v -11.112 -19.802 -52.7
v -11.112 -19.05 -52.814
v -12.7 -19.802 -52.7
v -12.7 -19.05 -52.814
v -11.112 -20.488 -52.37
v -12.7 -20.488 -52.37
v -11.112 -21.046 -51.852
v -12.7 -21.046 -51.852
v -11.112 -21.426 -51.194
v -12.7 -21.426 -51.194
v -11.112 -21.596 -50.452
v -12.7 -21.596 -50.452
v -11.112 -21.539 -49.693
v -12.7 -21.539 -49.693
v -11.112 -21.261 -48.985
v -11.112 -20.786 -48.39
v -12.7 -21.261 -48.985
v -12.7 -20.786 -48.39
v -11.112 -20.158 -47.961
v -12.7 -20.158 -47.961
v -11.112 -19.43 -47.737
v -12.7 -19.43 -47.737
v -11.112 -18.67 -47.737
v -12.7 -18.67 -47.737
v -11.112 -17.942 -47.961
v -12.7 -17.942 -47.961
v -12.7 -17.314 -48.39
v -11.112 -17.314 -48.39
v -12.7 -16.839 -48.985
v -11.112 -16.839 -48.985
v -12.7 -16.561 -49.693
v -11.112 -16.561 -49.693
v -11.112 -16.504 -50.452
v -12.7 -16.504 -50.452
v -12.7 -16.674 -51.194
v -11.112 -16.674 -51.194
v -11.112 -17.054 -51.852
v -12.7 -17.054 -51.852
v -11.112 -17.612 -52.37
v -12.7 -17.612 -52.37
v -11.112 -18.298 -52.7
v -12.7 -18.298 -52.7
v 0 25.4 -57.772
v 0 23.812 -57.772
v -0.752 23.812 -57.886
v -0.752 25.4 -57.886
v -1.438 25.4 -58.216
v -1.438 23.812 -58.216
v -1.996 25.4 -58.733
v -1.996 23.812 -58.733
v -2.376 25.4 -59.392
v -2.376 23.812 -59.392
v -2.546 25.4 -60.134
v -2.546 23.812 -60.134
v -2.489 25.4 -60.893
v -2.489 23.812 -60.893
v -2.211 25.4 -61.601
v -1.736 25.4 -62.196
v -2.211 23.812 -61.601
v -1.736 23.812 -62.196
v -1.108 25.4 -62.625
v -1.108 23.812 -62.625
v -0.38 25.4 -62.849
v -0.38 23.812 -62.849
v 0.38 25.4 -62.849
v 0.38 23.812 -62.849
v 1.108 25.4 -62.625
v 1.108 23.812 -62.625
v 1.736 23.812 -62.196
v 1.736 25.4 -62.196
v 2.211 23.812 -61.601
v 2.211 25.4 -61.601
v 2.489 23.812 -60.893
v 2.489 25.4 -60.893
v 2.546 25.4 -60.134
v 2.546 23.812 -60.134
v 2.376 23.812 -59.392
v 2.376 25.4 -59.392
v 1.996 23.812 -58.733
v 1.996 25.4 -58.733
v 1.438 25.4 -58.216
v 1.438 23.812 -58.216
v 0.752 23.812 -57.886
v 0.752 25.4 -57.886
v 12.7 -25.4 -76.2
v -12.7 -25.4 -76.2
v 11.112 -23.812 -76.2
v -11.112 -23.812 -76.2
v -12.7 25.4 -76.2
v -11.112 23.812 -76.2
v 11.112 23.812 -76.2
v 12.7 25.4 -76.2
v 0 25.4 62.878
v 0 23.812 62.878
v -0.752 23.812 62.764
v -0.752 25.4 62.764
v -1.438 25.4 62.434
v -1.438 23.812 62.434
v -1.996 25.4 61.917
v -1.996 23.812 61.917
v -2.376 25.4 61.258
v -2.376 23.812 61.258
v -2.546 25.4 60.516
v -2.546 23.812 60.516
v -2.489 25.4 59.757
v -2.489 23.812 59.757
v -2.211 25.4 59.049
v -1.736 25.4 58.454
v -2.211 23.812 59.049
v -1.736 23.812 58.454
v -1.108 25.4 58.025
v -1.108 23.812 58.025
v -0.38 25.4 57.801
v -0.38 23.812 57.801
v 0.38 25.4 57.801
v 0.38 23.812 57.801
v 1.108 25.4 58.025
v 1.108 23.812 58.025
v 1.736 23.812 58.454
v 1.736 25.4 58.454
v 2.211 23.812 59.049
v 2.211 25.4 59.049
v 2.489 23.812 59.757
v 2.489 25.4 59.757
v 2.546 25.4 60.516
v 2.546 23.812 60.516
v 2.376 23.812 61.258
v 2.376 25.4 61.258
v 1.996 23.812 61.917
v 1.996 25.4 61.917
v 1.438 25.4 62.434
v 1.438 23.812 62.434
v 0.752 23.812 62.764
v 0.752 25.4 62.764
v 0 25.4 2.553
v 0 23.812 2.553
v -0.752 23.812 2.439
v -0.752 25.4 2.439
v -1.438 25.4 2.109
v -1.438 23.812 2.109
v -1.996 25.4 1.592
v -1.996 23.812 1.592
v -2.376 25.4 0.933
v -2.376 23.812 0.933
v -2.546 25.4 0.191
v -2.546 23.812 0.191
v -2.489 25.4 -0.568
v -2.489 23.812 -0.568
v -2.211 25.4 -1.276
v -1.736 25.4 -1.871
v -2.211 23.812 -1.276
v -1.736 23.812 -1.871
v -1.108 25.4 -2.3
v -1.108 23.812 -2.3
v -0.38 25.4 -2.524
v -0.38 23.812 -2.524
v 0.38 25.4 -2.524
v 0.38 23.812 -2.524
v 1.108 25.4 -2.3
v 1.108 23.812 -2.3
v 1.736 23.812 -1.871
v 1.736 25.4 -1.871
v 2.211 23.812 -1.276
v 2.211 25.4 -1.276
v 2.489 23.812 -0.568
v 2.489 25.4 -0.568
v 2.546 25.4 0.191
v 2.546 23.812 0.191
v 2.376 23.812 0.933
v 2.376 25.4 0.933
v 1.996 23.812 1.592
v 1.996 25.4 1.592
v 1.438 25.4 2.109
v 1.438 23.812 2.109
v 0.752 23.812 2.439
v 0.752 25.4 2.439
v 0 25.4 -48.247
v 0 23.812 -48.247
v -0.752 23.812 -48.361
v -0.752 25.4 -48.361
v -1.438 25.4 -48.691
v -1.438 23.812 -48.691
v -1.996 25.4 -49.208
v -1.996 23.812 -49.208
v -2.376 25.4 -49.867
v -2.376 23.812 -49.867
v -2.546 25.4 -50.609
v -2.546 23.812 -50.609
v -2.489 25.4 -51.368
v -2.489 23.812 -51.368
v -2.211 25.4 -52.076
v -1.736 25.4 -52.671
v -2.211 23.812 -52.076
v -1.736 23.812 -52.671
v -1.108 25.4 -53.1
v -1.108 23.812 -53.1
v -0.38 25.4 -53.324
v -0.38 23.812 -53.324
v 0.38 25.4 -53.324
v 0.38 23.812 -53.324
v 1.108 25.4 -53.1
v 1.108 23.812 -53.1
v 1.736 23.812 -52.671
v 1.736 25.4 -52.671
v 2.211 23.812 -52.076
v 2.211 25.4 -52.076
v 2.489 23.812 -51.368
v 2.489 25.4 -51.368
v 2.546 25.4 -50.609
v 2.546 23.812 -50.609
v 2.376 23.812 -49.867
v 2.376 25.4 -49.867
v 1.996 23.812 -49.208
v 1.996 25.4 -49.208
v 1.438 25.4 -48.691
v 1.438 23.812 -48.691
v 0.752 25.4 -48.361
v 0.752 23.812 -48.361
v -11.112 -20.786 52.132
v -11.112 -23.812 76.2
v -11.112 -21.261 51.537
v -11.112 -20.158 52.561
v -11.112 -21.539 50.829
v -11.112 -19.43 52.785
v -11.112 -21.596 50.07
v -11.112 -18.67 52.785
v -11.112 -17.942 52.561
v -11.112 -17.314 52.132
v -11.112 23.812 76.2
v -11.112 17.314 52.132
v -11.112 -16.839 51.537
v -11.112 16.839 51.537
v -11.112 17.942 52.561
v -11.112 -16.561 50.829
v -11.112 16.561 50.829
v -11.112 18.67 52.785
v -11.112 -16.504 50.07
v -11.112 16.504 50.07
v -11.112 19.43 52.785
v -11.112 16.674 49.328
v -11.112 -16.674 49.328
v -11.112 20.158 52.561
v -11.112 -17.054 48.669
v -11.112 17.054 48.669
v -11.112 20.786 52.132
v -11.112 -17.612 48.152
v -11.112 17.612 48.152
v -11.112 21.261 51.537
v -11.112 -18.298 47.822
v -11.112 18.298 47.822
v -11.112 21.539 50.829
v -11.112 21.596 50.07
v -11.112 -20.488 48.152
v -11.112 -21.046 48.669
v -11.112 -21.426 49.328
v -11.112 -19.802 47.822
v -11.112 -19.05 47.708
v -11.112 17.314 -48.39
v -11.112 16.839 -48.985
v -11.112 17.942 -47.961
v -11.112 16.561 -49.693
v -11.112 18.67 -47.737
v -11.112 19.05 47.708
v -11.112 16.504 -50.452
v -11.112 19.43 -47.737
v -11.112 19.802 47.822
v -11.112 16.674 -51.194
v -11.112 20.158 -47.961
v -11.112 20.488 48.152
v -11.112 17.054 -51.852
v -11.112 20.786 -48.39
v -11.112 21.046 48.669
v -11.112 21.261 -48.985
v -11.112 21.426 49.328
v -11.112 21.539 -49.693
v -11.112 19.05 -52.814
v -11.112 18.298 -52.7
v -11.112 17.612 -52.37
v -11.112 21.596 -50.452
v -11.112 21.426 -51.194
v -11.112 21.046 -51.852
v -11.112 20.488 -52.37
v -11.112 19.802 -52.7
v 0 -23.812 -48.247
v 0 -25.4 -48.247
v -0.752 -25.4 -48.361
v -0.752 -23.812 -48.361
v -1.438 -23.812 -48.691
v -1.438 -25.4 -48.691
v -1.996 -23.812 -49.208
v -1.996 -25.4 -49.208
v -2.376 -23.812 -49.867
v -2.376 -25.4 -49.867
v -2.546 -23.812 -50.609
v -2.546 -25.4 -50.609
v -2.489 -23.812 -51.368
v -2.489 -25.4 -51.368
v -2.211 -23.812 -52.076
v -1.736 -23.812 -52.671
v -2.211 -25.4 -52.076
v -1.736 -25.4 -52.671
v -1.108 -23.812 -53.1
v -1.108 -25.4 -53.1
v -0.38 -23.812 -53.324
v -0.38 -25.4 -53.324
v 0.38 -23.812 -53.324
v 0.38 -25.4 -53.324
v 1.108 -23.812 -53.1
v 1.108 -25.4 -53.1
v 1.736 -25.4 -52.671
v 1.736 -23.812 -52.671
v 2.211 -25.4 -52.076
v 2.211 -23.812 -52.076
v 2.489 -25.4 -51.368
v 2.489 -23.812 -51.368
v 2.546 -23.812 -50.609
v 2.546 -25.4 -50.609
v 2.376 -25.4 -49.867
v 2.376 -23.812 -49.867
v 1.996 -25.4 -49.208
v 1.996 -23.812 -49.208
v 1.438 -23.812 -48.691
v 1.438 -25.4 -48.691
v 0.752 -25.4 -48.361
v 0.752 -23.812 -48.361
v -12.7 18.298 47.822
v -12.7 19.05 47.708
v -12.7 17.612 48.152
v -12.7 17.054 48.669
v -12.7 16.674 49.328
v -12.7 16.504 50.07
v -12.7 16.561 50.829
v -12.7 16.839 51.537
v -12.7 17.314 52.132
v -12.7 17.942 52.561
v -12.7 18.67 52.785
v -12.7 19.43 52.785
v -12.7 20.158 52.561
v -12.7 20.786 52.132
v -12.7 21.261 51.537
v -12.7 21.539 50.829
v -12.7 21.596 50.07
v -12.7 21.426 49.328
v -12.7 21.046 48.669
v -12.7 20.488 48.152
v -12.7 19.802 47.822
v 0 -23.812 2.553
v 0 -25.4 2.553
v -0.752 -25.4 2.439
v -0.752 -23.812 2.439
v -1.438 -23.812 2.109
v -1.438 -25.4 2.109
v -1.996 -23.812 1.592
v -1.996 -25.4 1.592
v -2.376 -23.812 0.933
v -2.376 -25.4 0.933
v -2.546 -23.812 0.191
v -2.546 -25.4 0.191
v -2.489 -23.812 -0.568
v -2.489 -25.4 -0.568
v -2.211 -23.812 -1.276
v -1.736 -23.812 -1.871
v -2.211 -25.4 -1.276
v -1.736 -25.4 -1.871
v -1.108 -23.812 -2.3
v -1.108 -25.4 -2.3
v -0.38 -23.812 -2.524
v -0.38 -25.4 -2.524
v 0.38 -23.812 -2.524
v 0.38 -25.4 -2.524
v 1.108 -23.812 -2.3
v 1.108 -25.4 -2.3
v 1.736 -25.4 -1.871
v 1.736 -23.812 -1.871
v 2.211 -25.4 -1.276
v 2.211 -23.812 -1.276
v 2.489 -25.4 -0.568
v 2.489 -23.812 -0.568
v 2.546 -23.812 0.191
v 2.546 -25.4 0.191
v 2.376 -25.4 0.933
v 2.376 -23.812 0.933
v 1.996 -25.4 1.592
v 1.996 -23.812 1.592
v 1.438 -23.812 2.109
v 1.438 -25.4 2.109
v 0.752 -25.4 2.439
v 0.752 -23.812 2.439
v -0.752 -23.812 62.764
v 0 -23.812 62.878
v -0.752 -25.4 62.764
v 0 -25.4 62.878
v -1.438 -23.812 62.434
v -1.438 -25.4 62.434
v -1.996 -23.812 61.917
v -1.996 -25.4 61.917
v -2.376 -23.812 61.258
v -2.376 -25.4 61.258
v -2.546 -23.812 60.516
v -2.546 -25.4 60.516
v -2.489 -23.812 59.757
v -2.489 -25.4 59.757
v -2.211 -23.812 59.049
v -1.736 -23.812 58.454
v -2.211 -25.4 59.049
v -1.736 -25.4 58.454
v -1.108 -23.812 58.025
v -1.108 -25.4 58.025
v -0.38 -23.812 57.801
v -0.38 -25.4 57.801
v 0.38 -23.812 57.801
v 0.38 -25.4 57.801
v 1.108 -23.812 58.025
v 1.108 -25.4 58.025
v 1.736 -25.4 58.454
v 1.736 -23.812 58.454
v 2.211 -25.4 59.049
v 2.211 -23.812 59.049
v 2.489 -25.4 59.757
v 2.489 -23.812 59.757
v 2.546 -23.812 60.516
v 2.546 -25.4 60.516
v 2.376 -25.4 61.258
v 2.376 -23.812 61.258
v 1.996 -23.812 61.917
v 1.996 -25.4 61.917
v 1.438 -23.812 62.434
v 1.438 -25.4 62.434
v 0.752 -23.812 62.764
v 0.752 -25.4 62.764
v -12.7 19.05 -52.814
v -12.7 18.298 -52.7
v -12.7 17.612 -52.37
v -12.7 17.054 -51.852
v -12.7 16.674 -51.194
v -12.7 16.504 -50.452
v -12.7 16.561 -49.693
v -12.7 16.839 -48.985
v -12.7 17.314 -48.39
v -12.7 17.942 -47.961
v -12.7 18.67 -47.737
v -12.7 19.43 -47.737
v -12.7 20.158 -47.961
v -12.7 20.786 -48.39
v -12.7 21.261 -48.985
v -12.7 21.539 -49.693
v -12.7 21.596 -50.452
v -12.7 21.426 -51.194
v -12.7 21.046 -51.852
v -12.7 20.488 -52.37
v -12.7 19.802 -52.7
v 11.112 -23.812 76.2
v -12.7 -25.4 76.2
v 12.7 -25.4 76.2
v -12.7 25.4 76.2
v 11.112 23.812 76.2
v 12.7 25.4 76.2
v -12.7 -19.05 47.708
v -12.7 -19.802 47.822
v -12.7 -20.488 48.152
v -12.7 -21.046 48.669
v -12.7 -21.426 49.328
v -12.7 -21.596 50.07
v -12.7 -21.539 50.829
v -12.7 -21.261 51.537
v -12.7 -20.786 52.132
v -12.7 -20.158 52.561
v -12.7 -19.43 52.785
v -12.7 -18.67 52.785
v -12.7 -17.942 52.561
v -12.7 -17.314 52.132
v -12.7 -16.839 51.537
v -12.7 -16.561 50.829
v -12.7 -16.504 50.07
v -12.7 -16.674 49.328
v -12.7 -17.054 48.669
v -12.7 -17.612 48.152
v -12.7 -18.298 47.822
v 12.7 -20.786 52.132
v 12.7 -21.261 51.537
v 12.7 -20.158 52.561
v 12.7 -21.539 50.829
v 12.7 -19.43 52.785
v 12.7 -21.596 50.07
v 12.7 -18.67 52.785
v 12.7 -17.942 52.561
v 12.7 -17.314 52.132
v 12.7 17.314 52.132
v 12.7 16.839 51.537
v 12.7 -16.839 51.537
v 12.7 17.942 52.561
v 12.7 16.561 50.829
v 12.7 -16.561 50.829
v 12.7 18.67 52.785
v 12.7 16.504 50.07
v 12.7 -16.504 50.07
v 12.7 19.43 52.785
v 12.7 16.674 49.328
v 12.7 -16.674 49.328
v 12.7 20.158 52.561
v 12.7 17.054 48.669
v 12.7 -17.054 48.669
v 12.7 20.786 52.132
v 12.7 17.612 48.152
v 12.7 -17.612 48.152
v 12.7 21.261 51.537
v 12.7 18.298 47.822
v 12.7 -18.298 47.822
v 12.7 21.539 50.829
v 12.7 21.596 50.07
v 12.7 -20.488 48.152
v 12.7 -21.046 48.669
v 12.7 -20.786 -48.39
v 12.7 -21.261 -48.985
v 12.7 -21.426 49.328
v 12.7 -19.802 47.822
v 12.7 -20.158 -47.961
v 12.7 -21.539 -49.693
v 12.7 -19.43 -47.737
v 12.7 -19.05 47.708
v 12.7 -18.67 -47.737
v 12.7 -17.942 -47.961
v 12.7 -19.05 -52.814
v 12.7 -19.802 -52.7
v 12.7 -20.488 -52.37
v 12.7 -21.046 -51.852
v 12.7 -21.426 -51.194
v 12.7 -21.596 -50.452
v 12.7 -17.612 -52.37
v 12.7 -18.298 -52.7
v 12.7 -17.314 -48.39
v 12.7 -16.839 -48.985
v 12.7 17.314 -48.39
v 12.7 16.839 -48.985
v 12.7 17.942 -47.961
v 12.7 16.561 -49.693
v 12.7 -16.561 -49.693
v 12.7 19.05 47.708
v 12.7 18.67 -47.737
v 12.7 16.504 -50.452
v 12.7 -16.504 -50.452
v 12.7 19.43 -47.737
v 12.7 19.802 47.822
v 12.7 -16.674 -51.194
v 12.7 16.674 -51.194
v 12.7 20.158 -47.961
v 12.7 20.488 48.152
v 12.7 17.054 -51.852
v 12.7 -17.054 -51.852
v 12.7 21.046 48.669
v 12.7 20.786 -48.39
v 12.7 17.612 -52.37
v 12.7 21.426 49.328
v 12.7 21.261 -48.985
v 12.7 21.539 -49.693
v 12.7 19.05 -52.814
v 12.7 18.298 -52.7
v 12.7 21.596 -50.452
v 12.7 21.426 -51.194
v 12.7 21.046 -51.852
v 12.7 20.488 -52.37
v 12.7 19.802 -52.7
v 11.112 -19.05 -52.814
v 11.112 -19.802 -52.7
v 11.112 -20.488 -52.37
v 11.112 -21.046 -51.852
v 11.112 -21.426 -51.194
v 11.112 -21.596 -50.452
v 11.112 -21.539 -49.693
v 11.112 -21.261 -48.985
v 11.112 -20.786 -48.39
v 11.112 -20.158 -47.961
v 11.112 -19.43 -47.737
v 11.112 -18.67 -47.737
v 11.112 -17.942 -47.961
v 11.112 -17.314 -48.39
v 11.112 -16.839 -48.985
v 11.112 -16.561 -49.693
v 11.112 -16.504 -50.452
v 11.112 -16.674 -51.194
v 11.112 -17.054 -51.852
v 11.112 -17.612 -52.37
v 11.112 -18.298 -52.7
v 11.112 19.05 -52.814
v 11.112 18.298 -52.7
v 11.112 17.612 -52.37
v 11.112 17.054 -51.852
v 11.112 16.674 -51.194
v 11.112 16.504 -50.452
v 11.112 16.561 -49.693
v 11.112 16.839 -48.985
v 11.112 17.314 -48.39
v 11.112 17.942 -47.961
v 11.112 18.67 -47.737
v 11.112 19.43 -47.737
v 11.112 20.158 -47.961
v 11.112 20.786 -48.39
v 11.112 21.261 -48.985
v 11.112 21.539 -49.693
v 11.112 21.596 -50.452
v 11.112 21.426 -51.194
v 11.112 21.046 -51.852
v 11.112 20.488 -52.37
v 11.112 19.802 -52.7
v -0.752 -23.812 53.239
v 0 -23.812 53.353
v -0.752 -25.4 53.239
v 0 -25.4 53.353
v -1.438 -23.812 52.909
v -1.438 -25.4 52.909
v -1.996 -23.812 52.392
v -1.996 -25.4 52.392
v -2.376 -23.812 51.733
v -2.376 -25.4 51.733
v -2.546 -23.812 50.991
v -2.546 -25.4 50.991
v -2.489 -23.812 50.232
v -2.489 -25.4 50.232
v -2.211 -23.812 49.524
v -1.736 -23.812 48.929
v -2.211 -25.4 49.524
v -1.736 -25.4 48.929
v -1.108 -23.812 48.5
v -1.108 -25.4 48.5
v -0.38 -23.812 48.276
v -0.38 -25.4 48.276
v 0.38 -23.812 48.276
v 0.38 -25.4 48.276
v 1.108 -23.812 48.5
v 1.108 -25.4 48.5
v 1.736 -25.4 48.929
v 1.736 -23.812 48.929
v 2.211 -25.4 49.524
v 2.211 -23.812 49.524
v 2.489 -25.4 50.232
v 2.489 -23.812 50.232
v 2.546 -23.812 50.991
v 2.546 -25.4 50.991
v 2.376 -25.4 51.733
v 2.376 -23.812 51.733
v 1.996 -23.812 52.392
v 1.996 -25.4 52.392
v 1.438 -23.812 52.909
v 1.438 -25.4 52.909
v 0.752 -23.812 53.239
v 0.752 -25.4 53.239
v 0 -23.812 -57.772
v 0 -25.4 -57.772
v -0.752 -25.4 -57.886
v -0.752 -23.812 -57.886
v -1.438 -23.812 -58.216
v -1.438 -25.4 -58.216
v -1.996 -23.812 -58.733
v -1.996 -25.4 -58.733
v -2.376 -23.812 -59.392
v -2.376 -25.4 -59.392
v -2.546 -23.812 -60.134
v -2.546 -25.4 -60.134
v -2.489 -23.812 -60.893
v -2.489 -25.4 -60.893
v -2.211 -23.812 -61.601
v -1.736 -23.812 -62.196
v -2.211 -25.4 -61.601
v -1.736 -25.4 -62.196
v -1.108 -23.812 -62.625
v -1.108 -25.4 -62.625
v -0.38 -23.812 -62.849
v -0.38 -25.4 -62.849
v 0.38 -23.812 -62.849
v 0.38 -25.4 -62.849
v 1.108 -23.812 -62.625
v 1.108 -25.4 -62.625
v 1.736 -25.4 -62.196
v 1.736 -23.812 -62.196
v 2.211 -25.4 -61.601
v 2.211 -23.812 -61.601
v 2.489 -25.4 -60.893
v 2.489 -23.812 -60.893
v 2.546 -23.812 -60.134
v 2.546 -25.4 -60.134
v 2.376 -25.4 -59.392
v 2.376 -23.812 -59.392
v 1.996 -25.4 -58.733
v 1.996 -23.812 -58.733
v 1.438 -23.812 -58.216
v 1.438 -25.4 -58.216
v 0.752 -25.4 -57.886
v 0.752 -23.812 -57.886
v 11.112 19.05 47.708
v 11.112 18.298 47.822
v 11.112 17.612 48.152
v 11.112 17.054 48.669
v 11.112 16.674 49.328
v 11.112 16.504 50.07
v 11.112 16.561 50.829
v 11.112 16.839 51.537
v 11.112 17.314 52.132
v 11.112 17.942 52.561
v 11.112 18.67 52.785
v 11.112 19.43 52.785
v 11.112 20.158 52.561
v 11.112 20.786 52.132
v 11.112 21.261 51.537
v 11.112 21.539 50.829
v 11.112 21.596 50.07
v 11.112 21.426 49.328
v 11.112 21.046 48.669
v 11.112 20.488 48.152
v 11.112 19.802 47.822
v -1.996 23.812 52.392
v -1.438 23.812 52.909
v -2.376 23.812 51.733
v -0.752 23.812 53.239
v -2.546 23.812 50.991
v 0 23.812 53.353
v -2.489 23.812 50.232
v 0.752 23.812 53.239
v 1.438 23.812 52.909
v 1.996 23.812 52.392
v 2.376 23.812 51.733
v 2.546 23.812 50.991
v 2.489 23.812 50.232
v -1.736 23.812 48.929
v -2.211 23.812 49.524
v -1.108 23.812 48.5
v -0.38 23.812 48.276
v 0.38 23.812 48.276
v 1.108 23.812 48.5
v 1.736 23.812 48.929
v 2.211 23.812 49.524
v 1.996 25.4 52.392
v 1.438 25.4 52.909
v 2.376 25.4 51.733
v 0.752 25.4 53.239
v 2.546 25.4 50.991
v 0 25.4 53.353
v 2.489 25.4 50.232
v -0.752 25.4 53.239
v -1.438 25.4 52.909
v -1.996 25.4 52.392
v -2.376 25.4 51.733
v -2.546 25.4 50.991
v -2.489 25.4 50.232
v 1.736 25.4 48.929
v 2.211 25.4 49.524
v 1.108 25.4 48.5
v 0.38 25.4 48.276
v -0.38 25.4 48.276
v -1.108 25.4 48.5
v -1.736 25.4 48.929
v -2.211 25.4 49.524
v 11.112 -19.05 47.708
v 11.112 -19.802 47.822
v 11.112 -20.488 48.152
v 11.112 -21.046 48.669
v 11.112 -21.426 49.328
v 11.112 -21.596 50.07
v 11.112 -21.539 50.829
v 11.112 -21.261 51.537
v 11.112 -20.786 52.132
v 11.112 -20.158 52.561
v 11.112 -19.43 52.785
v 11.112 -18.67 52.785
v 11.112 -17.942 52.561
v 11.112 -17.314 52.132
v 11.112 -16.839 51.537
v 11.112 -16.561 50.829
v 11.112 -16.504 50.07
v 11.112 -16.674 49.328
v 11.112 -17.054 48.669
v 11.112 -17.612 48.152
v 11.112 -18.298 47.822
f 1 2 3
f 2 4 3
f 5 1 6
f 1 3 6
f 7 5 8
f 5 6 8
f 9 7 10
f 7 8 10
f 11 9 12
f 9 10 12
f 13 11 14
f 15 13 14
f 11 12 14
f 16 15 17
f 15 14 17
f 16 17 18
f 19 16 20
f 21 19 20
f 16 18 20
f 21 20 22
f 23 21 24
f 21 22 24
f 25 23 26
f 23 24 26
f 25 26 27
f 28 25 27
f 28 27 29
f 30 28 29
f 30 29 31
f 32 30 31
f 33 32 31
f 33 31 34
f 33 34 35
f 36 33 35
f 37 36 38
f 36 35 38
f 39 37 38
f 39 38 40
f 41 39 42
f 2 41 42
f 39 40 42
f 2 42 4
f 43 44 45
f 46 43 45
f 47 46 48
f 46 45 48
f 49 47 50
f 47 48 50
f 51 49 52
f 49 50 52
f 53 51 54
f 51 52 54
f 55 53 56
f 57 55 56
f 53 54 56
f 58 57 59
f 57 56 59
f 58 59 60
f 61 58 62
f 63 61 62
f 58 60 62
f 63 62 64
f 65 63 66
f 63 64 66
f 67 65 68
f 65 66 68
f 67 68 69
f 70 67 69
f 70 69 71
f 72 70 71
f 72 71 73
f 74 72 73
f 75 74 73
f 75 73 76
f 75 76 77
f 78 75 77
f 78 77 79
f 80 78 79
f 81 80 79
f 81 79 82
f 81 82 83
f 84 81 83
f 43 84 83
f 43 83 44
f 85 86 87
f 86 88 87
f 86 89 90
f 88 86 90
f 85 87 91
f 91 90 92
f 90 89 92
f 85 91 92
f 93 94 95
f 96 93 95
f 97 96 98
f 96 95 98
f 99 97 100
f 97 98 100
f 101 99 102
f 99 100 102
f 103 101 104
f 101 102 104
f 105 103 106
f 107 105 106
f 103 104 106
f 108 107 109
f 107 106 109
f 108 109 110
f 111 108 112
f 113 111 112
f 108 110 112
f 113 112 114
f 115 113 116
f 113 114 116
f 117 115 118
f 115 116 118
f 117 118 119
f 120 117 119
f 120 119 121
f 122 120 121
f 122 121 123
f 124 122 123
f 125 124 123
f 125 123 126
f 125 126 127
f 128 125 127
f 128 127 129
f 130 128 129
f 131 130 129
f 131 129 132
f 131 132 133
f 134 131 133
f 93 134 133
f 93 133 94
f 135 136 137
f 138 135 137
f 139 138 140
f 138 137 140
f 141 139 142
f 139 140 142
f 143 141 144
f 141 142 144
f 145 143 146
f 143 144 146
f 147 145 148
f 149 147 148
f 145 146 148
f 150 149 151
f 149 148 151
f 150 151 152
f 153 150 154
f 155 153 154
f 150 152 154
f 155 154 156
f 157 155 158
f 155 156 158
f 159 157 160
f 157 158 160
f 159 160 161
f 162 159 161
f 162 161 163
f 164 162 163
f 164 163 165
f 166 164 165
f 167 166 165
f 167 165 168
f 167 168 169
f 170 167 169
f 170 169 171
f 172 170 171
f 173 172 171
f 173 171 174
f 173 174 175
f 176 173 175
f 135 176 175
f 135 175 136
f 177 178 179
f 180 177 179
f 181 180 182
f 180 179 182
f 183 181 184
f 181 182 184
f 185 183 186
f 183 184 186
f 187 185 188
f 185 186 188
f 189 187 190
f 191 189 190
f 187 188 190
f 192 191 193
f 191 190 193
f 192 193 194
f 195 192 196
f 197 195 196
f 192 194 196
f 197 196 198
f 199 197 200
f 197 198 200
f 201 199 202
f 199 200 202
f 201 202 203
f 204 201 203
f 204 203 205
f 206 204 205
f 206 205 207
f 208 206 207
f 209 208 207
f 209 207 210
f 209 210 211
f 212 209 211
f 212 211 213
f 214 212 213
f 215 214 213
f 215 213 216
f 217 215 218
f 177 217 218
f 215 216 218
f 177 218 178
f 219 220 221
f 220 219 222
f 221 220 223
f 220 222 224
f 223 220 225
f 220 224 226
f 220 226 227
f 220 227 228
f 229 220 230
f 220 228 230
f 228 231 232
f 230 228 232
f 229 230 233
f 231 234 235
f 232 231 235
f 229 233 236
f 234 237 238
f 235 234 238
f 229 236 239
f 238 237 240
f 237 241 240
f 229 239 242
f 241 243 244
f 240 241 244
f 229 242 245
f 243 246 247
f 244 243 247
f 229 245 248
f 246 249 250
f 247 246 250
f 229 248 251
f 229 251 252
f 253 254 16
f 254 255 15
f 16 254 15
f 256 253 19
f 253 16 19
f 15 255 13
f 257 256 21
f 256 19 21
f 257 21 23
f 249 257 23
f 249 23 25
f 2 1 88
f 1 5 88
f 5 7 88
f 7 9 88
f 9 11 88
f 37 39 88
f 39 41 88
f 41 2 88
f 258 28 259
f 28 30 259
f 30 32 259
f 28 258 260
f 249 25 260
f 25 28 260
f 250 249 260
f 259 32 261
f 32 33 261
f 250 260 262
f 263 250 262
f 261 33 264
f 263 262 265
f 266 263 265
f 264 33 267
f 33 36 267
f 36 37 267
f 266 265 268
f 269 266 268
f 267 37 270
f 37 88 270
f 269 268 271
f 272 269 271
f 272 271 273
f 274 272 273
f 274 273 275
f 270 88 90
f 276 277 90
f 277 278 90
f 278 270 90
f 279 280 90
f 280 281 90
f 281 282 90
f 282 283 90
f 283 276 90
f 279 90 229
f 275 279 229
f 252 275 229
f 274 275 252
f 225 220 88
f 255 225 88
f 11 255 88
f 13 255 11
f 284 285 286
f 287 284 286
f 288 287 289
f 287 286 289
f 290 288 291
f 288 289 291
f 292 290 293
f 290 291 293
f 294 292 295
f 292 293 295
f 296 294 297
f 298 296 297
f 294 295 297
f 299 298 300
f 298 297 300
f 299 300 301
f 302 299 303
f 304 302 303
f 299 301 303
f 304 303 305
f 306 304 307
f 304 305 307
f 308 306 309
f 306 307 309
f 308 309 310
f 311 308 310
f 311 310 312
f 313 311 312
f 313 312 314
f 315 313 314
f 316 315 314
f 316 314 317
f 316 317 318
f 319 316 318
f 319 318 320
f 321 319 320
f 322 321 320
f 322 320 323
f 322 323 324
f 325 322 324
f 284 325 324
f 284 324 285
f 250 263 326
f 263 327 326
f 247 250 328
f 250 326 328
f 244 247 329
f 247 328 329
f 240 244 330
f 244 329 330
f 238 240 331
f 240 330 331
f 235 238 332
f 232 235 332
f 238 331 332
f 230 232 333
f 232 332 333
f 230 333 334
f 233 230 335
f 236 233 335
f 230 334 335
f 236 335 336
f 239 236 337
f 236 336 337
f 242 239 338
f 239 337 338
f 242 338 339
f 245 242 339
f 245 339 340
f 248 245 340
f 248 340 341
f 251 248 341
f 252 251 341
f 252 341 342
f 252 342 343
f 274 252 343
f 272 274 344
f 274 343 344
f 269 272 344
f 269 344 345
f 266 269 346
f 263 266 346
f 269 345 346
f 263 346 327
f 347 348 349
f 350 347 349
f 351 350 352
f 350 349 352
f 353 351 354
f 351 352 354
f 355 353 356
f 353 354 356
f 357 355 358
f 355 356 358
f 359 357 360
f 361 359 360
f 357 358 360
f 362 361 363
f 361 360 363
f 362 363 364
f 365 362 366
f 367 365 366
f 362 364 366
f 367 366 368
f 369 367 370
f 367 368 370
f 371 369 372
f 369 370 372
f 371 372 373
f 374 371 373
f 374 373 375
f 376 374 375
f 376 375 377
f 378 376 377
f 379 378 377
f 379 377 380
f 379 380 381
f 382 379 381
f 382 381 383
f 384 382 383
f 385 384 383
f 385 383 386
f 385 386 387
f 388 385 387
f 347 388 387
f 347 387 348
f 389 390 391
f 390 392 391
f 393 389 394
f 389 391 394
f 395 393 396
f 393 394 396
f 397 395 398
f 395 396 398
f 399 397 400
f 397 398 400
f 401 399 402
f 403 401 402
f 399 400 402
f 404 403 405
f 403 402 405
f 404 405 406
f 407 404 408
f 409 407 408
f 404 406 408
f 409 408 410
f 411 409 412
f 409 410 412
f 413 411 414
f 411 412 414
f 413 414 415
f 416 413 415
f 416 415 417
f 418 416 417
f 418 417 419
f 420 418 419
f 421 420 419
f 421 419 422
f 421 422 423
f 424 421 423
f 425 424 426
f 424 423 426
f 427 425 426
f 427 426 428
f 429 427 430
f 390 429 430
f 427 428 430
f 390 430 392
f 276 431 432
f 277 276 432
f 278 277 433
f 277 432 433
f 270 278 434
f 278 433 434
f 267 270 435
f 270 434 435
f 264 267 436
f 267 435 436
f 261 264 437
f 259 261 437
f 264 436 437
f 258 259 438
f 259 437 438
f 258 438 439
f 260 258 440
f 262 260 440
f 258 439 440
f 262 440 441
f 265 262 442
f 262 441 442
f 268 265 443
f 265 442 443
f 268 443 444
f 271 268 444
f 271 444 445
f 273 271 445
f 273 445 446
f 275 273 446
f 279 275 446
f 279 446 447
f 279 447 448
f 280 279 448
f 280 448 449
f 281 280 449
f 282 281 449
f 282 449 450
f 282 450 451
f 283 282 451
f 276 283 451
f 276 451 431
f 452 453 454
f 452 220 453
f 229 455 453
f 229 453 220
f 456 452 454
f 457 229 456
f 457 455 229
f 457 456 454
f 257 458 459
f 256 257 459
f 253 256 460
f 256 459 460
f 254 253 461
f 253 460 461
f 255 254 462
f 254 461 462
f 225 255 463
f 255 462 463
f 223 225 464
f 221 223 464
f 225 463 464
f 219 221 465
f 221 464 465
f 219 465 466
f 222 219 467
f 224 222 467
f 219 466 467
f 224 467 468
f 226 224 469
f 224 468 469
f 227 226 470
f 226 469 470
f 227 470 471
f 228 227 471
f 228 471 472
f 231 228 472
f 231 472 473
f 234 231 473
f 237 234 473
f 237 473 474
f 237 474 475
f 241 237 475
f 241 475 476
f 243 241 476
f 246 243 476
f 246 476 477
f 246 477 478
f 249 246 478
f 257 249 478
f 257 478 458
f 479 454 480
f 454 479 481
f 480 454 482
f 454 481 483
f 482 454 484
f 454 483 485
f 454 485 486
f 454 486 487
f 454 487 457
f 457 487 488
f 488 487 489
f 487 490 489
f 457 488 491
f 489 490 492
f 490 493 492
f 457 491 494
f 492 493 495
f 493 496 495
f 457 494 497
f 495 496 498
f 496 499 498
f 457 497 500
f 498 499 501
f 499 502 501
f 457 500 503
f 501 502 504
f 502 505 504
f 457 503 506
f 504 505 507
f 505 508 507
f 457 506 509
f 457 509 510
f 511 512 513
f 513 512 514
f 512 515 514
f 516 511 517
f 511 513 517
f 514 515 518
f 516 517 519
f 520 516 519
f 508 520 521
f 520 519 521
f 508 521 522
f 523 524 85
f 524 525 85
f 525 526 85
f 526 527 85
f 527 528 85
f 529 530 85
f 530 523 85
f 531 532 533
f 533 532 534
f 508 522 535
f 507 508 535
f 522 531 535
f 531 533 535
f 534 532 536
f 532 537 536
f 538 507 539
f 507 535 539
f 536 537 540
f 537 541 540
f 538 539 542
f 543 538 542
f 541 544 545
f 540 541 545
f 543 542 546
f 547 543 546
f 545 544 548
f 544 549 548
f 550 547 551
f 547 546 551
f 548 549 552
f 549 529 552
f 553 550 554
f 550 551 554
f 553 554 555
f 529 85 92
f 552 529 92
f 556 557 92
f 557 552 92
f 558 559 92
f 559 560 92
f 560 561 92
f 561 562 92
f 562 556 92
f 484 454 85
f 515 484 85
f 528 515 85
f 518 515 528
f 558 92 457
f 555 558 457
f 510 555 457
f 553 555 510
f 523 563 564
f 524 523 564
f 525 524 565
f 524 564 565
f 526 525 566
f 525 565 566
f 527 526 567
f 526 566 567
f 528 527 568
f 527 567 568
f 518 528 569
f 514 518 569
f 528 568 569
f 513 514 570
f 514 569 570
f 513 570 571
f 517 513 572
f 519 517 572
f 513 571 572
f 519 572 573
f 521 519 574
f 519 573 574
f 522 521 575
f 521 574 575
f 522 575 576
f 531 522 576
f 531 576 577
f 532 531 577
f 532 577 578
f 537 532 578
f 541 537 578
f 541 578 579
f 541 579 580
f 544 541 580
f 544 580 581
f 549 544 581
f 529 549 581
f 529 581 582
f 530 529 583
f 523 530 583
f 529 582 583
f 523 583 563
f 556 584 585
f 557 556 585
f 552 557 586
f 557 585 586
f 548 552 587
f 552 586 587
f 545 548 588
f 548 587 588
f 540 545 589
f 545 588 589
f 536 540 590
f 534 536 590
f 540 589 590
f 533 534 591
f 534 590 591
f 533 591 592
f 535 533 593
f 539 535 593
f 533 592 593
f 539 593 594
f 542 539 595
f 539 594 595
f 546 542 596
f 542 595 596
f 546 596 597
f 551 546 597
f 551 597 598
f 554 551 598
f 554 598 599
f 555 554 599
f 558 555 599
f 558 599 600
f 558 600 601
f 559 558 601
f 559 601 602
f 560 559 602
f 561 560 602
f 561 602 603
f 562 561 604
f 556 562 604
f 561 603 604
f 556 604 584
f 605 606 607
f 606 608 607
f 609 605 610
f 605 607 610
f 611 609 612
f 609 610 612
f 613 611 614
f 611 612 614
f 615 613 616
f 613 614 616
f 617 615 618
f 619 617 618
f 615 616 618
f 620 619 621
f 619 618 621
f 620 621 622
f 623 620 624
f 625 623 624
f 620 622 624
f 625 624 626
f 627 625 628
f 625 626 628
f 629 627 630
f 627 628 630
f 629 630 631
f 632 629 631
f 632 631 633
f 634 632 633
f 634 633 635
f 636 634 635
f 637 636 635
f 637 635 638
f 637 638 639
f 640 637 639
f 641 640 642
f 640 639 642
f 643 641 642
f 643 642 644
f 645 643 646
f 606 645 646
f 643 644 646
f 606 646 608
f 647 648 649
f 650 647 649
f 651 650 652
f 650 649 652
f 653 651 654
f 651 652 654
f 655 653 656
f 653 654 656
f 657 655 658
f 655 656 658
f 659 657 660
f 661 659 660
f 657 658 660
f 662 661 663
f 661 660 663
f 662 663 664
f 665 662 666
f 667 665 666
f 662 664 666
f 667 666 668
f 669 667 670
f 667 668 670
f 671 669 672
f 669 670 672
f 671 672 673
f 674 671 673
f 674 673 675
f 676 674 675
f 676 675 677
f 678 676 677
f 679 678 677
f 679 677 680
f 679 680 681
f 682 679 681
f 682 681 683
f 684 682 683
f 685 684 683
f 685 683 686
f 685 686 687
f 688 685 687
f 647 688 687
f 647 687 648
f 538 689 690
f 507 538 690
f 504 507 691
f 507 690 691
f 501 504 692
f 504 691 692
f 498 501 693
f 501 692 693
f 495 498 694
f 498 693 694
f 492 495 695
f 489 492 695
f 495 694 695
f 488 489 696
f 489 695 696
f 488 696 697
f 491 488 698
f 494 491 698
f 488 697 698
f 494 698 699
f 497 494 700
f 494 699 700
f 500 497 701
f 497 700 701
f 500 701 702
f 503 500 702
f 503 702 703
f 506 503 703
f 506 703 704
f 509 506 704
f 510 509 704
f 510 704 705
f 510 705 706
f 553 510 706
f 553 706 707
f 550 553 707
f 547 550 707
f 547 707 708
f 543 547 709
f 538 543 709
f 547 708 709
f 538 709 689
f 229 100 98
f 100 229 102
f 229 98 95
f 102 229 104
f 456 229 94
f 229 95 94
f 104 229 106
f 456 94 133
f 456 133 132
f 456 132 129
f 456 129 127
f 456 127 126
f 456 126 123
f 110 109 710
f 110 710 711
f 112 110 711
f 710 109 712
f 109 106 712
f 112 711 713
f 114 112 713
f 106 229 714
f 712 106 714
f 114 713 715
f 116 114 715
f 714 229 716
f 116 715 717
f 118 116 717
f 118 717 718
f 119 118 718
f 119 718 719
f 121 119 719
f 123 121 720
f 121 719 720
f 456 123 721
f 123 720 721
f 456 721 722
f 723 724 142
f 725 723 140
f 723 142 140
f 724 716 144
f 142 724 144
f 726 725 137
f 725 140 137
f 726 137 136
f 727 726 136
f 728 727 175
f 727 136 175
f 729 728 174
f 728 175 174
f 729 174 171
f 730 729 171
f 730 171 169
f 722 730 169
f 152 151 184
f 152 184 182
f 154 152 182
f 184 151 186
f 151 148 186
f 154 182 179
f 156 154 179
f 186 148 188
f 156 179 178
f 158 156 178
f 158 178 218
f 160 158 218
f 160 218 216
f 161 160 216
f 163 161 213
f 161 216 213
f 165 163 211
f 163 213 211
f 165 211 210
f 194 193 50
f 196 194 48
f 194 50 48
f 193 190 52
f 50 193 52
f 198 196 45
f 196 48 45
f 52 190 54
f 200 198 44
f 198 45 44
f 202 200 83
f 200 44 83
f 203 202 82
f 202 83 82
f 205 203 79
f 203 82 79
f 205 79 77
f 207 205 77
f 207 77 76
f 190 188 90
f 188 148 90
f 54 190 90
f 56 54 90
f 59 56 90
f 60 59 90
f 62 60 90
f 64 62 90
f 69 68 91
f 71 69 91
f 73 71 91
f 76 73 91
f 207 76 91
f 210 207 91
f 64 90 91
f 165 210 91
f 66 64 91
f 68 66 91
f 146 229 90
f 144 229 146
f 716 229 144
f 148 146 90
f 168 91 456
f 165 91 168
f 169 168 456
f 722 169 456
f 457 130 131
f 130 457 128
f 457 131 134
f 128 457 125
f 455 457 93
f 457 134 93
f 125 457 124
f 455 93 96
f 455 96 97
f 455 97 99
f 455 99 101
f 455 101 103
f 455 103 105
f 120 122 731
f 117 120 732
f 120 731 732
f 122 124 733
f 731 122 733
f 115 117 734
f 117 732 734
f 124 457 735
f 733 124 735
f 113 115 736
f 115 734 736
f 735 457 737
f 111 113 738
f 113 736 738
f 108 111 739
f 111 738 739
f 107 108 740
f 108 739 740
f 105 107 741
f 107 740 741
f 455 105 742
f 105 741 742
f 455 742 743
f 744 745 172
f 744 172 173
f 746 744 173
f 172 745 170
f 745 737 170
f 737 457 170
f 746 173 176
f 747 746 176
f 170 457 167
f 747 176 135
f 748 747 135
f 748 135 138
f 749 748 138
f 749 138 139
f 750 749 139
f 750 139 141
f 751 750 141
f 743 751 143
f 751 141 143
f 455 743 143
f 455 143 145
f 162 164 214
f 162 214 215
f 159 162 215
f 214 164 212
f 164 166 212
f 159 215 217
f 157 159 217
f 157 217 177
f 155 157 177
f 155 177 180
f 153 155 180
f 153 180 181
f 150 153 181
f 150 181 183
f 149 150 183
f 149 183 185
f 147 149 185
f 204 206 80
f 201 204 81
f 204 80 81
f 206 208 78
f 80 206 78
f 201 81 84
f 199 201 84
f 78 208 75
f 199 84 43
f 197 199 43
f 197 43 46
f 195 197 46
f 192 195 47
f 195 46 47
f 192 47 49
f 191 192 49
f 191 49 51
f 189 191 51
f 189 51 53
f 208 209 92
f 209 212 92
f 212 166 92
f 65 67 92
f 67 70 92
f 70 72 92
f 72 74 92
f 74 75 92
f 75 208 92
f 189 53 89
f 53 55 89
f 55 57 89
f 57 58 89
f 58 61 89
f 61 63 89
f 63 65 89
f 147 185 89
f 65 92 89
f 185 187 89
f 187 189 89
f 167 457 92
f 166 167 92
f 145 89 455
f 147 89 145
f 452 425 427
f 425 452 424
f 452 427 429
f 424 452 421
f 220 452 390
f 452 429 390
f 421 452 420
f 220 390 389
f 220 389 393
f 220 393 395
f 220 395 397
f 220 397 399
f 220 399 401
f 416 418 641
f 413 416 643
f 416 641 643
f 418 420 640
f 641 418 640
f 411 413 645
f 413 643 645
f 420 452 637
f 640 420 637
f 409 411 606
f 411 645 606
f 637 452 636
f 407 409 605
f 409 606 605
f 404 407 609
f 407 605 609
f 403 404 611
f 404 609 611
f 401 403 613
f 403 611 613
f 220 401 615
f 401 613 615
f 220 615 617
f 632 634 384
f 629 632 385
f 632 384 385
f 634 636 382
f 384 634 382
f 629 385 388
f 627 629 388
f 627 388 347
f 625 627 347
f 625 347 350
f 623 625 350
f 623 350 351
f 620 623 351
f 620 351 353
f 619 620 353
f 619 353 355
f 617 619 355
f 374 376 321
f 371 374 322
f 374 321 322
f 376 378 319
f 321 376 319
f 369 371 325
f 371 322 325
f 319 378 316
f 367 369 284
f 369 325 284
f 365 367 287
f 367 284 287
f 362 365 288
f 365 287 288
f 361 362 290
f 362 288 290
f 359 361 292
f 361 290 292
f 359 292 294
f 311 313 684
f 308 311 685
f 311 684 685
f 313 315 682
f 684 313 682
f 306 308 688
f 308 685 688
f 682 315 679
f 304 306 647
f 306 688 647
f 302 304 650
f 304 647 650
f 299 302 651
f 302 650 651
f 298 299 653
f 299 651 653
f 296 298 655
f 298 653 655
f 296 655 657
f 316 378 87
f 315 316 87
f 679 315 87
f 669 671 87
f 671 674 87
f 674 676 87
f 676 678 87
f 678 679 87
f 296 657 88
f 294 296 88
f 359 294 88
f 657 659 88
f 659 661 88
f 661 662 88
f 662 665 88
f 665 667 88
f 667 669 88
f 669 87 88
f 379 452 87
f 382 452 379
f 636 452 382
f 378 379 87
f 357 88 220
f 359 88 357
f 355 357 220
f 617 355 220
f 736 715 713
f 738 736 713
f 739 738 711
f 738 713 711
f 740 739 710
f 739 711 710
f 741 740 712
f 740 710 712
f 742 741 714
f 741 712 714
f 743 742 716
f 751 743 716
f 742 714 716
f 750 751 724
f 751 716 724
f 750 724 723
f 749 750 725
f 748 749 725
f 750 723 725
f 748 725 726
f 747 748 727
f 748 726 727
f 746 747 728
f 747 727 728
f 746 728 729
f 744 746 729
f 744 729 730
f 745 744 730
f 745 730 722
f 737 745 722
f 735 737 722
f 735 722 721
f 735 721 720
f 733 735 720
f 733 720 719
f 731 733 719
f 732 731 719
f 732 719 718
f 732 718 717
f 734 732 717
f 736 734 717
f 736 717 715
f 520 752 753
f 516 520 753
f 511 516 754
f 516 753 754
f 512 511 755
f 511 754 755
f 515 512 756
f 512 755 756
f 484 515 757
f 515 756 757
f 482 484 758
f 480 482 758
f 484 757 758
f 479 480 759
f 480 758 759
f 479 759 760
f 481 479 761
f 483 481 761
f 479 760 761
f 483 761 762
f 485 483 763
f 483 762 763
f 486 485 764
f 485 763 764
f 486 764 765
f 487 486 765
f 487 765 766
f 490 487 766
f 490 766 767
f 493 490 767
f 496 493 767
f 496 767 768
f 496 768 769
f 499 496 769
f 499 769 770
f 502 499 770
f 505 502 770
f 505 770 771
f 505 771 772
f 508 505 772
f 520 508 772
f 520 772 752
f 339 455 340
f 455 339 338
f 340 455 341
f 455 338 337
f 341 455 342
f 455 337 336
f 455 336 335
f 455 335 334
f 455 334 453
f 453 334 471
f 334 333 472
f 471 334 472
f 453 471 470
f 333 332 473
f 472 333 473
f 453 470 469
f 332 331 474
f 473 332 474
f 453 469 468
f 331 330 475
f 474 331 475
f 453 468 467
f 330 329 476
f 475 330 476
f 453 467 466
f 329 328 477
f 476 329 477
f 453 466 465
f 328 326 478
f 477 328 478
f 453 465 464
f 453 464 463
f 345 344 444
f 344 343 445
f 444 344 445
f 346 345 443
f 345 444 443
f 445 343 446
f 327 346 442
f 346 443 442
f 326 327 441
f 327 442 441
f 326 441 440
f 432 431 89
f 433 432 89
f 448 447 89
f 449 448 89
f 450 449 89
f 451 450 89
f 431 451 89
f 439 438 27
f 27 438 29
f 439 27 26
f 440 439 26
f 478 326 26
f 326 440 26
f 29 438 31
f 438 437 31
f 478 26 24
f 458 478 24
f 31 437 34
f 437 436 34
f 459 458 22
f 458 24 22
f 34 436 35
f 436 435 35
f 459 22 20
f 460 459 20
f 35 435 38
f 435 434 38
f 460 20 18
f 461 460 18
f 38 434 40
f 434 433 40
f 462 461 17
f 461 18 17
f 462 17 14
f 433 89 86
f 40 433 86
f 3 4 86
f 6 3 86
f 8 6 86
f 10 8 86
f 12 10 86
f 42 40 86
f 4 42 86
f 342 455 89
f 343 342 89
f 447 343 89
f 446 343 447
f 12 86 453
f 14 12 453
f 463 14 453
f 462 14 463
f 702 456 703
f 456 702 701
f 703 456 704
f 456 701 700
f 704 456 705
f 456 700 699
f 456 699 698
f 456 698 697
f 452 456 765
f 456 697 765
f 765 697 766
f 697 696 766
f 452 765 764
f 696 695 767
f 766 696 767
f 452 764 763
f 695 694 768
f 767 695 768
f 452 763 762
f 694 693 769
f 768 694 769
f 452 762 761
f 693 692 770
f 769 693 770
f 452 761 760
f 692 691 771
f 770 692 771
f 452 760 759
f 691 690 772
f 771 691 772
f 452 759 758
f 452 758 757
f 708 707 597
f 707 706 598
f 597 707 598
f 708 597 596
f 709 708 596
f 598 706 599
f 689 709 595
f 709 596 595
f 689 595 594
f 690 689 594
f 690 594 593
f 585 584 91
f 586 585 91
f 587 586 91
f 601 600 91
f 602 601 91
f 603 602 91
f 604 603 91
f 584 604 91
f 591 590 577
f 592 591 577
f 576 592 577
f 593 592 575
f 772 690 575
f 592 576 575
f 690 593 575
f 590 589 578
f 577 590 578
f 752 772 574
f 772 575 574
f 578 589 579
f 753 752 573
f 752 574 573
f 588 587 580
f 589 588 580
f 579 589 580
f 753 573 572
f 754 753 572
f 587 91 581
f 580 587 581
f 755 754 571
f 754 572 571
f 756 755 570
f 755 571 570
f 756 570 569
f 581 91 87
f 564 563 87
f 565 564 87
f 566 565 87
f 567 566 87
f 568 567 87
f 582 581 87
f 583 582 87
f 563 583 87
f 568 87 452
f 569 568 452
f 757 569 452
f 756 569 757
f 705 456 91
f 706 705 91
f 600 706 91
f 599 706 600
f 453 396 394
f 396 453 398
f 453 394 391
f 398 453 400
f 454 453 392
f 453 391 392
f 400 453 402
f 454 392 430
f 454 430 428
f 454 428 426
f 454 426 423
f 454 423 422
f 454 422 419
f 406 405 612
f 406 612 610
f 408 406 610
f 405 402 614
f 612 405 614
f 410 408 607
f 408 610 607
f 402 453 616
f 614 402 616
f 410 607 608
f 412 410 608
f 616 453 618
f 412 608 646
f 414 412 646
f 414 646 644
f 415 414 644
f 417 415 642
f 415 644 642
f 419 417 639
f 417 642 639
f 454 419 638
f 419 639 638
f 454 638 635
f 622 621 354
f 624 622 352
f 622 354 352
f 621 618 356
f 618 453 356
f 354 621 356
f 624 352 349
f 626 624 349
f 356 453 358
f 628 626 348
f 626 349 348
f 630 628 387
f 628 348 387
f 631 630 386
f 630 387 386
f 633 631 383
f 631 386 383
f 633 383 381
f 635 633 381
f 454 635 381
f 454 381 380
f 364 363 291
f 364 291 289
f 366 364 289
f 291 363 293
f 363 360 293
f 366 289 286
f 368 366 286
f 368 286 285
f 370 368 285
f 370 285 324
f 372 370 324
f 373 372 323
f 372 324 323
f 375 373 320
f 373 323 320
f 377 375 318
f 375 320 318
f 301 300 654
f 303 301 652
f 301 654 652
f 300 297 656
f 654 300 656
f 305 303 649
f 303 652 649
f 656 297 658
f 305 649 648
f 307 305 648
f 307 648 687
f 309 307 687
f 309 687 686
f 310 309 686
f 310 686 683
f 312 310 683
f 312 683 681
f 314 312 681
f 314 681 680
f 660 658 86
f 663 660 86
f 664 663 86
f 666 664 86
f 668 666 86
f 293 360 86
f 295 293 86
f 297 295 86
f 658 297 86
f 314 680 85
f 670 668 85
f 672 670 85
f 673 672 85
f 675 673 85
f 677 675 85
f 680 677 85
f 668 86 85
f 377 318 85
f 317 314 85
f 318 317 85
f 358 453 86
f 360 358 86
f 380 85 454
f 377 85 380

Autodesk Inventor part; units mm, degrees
ref_plane "YZ Plane" through (0, 0, 0) normal (1, 0, 0) x (0, 1, 0)
ref_plane "XZ Plane" through (0, 0, 0) normal (0, 1, 0) x (-1, 0, 0)
ref_plane "XY Plane" through (0, 0, 0) normal (0, 0, 1) x (1, 0, 0)
sketch "Sketch1" plane through (0, 0, 0) normal (0, 0, 1) x (1, 0, 0)
  line L0 (-12.7, -25.4) -> (12.7, -25.4)
  line L1 (12.7, -25.4) -> (12.7, 25.4)
  line L2 (12.7, 25.4) -> (-12.7, 25.4)
  line L3 (-12.7, 25.4) -> (-12.7, -25.4)
  line L4 (-12.7, -25.4) -> (12.7, 25.4) construction
  line L5 (12.7, -25.4) -> (-12.7, 25.4) construction
  line L6 (-11.1125, 23.8125) -> (11.1125, 23.8125)
  line L7 (11.1125, 23.8125) -> (11.1125, -23.8125)
  line L8 (11.1125, -23.8125) -> (-11.1125, -23.8125)
  line L9 (-11.1125, -23.8125) -> (-11.1125, 23.8125)
  point P0 (0, 0)
  dimension "width" = 25.4
  dimension "height" = 50.8
  dimension "thickness" = 1.5875
extrude "Extrusion1" add sketch "Sketch1" along normal mid plane 152.4
sketch "Sketch2" plane through (-12.7, 25.4, 76.2) normal (0, 1, 0) x (1, 0, 0)
  line L0 (0, 152.4) -> (0, 0) construction
  line L1 (25.4, 0) -> (0, 0) construction
  line L2 (25.4, 152.4) -> (25.4, 0) construction
  line L3 (0, 152.4) -> (25.4, 152.4) construction
  line L4 (12.7, 127) -> (12.7, 25.4) construction
  point P0 (12.7, 76.2)
  point P1 (12.7, 76.2)
  point P2 (12.7, 76.2)
  dimension "d5" = 101.6
hole "Hole1" at (0, 25.4, -50.8) at (0, 25.4, 50.8) at (0, 25.4, 0) direction (0, -1, 0) diameter 5.1054 end through all clearance for "Flat Head Machine Screw (82)" size "#10" standard "Ansi Unified Screw Threads"
sketch "Sketch4" plane through (12.7, -25.4, 76.2) normal (1, 0, 0) x (0, 0, -1)
  circle A0 centre (76.2, 25.4) radius 53.75 construction
  line L0 (25.9391, 6.35) -> (126.4609, 6.35) construction
  line L1 (126.4609, 6.35) -> (126.4609, 44.45) construction
  line L2 (126.4609, 44.45) -> (25.9391, 44.45) construction
  line L3 (25.9391, 44.45) -> (25.9391, 6.35) construction
  line L4 (25.9391, 6.35) -> (126.4609, 44.45) construction
  line L5 (126.4609, 6.35) -> (25.9391, 44.45) construction
  line L6 (0, 0) -> (0, 50.8) construction
  dimension "d25" = 107.5
  dimension "d28" = 38.1
hole "Hole3" at (12.7, 19.05, 50.2609) at (12.7, 19.05, -50.2609) at (12.7, -19.05, -50.2609) at (12.7, -19.05, 50.2609) direction (-1, 0, 0) diameter 5.1054 end through all clearance for "Flat Head Machine Screw (82)" size "#10" standard "Ansi Unified Screw Threads"
sketch "Sketch5" plane through (-12.7, 25.4, 76.2) normal (0, 1, 0) x (1, 0, 0)
  line L0 (25.4, 0) -> (0, 0) projected
  line L1 (12.7, 136.525) -> (12.7, 15.875) construction
  line L2 (0, 152.4) -> (0, 0) construction
  point P0 (12.7, 76.2)
  point P1 (12.7, 0)
  point P2 (12.7, 76.2)
  point P3 (0, 76.2)
  dimension "d36" = 120.65
hole "Hole4" at (0, 25.4, -60.325) at (0, 25.4, 60.325) direction (0, -1, 0) diameter 5.1054 end through all clearance for "Flat Head Machine Screw (82)" size "#10" standard "Ansi Unified Screw Threads"
sketch "Sketch3" plane through (12.7, -25.4, 76.2) normal (1, 0, 0) x (0, 0, -1)
  line L0 (25.9391, 44.45) -> (126.4609, 44.45) construction
  line L1 (126.4609, 44.45) -> (126.4609, 6.35) construction
  line L2 (126.4609, 6.35) -> (25.9391, 6.35) construction
  line L3 (25.9391, 6.35) -> (25.9391, 44.45) construction
  line L4 (25.9391, 44.45) -> (126.4609, 6.35) construction
  line L5 (126.4609, 44.45) -> (25.9391, 6.35) construction
  circle A0 centre (76.2, 25.4) radius 60 construction
  circle A1 centre (76.2, 25.4) radius 47.5 construction
  circle A2 centre (76.2, 25.4) radius 53.75 construction
  dimension "d16" = 107.5
  dimension "d14" = 120
  dimension "d15" = 95
  dimension "d17" = 38.1
properties part number "GP9-004" material "Aluminum 6061"
